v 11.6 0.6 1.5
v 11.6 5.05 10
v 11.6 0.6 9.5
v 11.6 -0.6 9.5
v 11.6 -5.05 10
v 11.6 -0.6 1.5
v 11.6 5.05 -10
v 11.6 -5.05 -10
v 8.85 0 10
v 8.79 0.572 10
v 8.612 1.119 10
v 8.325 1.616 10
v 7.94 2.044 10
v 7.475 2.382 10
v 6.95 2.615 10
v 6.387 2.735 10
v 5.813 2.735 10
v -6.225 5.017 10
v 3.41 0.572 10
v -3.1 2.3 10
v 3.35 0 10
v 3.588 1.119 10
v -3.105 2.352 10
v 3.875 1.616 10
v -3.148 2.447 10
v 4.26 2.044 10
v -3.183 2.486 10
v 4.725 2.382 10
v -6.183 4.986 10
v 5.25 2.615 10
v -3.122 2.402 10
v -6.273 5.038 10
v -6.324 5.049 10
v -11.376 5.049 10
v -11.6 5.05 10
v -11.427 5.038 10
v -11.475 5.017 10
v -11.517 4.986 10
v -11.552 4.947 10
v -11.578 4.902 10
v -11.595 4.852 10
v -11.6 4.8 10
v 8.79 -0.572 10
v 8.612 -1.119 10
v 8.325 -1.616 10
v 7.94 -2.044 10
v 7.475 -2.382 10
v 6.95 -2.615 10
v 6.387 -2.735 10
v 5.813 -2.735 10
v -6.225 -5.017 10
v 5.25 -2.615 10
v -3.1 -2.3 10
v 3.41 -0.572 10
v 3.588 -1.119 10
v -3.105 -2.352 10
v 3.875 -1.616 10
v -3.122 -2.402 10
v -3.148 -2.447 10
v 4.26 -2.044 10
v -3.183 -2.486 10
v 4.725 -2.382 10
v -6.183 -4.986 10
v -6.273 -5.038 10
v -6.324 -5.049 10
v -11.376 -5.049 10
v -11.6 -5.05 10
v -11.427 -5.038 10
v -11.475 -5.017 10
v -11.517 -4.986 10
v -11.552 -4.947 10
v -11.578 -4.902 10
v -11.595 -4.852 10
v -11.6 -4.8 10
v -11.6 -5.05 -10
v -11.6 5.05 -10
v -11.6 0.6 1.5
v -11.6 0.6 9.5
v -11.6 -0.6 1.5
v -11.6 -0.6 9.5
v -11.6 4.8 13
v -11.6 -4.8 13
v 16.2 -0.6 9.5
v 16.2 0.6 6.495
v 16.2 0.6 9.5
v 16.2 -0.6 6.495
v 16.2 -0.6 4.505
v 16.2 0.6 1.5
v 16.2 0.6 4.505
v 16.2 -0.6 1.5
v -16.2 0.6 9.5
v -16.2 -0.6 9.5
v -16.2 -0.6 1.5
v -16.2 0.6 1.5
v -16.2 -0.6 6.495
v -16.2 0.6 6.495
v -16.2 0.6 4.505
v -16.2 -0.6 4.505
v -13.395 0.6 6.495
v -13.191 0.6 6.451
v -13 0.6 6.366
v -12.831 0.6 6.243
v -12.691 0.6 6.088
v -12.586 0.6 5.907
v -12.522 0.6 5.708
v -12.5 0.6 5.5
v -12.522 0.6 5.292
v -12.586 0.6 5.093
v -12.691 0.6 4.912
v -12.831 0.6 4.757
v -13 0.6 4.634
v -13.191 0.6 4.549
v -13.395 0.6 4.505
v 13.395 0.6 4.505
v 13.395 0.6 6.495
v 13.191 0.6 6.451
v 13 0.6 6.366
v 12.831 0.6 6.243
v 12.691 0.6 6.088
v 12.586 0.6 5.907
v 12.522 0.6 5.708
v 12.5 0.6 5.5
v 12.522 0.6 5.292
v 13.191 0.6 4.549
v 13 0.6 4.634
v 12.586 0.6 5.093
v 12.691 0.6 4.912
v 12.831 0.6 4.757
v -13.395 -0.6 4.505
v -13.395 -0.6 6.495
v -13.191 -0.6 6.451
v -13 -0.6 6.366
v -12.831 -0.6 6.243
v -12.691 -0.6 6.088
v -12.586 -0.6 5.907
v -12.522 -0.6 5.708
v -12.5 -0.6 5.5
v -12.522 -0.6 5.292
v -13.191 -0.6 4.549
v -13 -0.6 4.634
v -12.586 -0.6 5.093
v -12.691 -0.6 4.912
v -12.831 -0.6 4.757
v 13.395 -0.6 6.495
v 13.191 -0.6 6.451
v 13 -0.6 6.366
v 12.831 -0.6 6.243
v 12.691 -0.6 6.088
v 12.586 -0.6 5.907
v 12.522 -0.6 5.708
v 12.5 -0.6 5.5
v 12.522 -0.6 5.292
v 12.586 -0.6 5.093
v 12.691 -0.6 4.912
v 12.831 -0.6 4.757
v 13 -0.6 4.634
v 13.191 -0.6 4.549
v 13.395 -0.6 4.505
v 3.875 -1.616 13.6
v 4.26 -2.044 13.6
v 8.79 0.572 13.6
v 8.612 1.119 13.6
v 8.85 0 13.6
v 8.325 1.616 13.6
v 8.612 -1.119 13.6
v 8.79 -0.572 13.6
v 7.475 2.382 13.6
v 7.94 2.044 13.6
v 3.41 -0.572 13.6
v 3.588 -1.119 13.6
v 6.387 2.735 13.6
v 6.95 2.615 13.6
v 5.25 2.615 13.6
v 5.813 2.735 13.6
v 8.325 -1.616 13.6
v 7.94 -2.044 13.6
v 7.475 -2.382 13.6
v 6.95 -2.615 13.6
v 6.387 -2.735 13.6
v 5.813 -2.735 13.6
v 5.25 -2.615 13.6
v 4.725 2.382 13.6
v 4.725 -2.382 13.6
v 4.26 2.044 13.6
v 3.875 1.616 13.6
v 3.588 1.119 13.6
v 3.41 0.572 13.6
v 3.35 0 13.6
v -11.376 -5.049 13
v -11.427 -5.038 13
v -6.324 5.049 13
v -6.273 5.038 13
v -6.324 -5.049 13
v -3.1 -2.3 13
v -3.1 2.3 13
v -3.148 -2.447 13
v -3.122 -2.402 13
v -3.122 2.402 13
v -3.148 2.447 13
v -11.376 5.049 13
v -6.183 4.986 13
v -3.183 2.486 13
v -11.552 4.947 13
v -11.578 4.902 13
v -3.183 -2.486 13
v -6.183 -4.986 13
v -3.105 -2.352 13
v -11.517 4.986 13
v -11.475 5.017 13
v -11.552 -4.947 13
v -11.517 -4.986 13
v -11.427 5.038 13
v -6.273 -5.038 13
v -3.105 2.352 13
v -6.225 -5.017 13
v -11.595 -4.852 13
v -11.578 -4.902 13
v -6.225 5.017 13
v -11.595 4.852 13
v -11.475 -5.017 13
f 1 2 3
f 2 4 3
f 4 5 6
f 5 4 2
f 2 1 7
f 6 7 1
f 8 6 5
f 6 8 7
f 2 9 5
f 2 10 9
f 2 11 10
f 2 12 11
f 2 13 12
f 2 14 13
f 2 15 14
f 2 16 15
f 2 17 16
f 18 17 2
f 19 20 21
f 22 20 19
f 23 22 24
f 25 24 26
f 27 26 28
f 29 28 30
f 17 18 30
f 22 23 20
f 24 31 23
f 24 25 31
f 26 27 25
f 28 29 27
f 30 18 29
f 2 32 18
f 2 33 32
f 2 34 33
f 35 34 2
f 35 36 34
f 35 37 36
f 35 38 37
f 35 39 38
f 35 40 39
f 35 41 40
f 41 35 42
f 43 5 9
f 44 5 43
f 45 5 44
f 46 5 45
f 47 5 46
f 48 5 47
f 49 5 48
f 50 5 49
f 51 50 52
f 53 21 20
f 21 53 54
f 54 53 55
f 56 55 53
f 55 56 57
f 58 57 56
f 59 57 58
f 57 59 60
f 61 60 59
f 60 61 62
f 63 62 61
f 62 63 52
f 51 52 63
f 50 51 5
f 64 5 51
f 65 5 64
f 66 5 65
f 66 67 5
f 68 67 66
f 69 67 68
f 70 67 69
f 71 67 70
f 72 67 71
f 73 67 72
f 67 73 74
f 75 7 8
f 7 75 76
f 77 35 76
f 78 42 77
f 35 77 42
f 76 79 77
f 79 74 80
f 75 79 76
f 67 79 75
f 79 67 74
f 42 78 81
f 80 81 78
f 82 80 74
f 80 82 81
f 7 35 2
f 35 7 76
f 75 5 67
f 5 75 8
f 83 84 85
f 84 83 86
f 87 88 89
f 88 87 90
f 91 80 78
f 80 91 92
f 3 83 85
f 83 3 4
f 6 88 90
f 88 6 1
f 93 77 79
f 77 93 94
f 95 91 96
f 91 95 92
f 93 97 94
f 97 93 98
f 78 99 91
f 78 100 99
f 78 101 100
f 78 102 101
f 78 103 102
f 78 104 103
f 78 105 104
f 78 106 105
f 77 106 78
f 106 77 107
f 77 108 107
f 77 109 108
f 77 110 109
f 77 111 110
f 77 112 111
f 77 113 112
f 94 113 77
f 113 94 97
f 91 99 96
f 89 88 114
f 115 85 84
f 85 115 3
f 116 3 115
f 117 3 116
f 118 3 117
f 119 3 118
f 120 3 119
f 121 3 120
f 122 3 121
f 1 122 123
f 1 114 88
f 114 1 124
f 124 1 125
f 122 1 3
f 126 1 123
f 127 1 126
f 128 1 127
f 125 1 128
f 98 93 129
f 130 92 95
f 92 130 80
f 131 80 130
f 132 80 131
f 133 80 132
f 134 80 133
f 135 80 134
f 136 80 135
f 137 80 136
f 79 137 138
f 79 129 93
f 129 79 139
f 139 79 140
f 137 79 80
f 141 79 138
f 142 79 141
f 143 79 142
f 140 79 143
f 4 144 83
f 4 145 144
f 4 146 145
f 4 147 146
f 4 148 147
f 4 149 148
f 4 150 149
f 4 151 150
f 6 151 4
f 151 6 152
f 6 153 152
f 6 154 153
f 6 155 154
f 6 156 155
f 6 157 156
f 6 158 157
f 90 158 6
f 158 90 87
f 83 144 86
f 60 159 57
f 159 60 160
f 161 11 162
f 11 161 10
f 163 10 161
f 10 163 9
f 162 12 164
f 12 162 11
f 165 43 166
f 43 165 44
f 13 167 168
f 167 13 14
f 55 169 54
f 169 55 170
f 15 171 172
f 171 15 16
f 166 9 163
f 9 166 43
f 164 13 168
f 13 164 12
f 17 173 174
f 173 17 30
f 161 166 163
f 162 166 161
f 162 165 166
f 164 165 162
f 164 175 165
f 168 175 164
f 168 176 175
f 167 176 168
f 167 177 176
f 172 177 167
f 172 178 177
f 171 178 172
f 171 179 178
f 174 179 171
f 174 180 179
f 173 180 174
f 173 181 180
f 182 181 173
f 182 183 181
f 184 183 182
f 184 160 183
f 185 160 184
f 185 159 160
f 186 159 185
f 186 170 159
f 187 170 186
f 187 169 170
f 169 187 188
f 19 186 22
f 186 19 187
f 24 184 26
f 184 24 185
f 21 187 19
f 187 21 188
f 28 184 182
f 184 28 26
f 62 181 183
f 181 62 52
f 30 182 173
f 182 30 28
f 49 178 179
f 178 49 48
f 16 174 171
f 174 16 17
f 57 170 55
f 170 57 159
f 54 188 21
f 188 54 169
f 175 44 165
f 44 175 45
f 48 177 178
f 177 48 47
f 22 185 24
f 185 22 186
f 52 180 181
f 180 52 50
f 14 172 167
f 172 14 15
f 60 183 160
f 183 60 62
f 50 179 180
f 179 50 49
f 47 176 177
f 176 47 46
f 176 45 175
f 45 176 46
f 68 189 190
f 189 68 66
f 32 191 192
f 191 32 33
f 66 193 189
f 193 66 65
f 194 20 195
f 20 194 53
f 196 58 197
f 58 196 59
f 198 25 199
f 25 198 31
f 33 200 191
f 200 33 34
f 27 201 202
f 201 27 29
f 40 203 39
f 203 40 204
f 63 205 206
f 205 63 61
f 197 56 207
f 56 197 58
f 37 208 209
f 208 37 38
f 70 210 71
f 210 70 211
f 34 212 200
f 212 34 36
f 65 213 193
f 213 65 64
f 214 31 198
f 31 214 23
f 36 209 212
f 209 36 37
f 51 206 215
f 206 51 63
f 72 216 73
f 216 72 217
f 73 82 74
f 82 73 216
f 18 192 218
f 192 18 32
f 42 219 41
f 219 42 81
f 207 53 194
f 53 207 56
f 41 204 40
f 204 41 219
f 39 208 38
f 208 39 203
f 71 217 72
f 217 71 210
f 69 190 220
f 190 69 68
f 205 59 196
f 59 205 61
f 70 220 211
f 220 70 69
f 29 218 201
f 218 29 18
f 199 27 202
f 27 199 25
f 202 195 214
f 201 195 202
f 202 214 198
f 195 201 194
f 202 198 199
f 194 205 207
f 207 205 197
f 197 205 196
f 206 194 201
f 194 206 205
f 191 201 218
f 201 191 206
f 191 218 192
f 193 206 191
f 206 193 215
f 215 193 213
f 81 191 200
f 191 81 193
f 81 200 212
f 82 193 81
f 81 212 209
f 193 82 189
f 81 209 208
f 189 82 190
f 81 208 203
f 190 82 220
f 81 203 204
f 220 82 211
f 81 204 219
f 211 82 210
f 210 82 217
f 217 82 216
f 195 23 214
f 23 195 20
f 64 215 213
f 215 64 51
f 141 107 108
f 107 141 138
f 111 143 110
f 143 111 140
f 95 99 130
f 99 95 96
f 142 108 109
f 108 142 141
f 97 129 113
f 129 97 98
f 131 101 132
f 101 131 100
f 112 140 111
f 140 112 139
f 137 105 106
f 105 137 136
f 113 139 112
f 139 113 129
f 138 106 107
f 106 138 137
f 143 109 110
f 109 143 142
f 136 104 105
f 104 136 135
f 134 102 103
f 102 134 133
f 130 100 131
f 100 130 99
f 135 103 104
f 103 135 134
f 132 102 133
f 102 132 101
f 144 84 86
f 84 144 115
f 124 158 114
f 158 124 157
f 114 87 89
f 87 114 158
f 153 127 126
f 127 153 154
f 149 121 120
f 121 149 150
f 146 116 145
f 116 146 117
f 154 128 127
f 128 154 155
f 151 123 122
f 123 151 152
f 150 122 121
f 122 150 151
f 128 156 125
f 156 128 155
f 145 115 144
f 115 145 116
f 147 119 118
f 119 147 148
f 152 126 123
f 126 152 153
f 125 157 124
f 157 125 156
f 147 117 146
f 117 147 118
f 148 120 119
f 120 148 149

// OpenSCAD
// file: ../../parameters.scad
maximum_printable_size = 150;

layer_thickness = 0.3;
global_clearance = 0.5;


//Screw diameter and nut for M10 [mm]
M10_screw_diameter = 10.4;
M10_head_height = 10;
M10_head_diameter = 16+0.5;
M10_nut_height = 10.5;
M10_nut_diameter = 25.5;
M10_nut_pocket = 22.3;

//Screw diameter for M8 [mm]
M8_screw_diameter = 8.6;
M8_head_height = 8;
M8_head_diameter = 13.5;
M8_nut_height = 7.5;
M8_square_nut_thin_height = 4.5;
M8_nut_diameter = 14.4 + 0.5;
M8_nut_pocket = 13 + 0.5;
M8_washer_diameter = 16;
M8_washer_thickness = 1.5;


//Screw diameter and nut for M6 [mm]
M6_screw_diameter=6.5;
M6_head_diameter = 10+0.5;
M6_head_height = 6;
M6_nut_height = 4.9;
M6_nut_diameter = 11.8;
M6_nut_pocket = 10.4;
M6_square_nut_height = 3;
M6_square_nut_diameter = 10;
M6_washer_thickness = 1.6;

//Screw diameter and nut for M5 [mm]
M5_screw_diameter=5.5;
M5_head_height = 5;
M5_head_diameter = 13+0.5;
M5_nut_height = 4.5;
M5_nut_diameter = 9.4;
M5_nut_pocket = 8.4;

//Screw diameter and nut for M4 [mm]
M4_screw_diameter=4.5;
M4_screw_head_height = 4;
M4_nut_height = 3.2;
M4_nut_diameter = 8.4;
M4_nut_pocket = 7.5;

//Screw diameter and nut for M3 [mm]
M3_screw_diameter = 3.2;
M3_nut_height = 2.7;
M3_nut_diameter = 6.6;
M3_nut_pocket = 5.6;
M3_screw_head_height = 3;

//Screw diameter and nut for M2,5 [mm]
M2_5_screw_diameter = 2.7;
M2_5_nut_height = 2.3;
M2_5_nut_diameter = 6;
M2_5_nut_pocket = 5.5;

// kulove lozisko

bearing_efsm_08_h = 33+1;
bearing_efsm_08_m = 22;
bearing_efsm_08_db = 18;
bearing_efsm_08_ag = 10.5;
bearing_efsm_08_n = M4_screw_diameter;
bearing_efsm_08_a1 = 5.5;
bearing_efsm_08_d = 8.25;
bearing_efsm_08_B = 8; // ball height

bearing_efsm_10_h = 38+1;
bearing_efsm_10_m = 26;
bearing_efsm_10_db = 21.9;
bearing_efsm_10_ag = 12+0.2;
bearing_efsm_10_n = M5_screw_diameter;
bearing_efsm_10_a1 = 6.5;
bearing_efsm_10_d = 10.25;


bearing_efsm_12_width = 40+1;
bearing_efsm_12_h = bearing_efsm_12_width;
bearing_efsm_12_boltd = 28/2; // polovina vzdalenosti mezi srouby
bearing_efsm_12_m = bearing_efsm_12_boltd*2;
bearing_efsm_12_db = 25;
bearing_efsm_12_ag = 13;
bearing_efsm_12_a1 = 7;
bearing_efsm_12_n = M5_screw_diameter;
bearing_efsm_12_d = 12.15;
bearing_efsm_12_B = 10; // ball height
bearing_efsm_space = 1;

bearing_efsm_17_width = 54+1;
bearing_efsm_17_h = bearing_efsm_17_width;
bearing_efsm_17_boltd = 38/2; // polovina vzdalenosti mezi srouby
bearing_efsm_17_m = bearing_efsm_17_boltd*2;
bearing_efsm_17_db = 35;
bearing_efsm_17_ag = 18;
bearing_efsm_17_n = M6_screw_diameter;
bearing_efsm_17_a1 = 10;
bearing_efsm_17_B = 17; // ball height

//limcove lozisko
bearing_EFOM_10_L=26; //celkova sirka zakladny
bearing_EFOM_10_d1=10.3;//diametr otvoru real=10 mm
bearing_EFOM_10_dB=22;//diametr vystupku pro ulozeni lozika
bearing_EFOM_10_H=52;//celková delka zakladny
bearing_EFOM_10_J=36;// hole pitch
bearing_EFOM_10_A1=6.5;//vyska pouzdra
bearing_EFOM_10_Ag=12;//celkova vyska
bearing_EFOM_10_N1=5;//sirka otvoru pro sroub
bearing_EFOM_10_N2=8;//delka otvoru pro sroub
bearing_EFOM_10_m=36;//roztec der pro sroub
bearing_EFOM_10_h=9;//vyska lozika


608_bearing_outer_diameter = 22.3;
608_bearing_inner_diameter = 16;
608_bearing_thickness = 7.1;


// 20 KG servo parameters

servo_20kg_axis_offset = 9.375; // jak je osa mimo stredu
servo_20kg_body_x = 42;
servo_20kg_body_y = 21;
servo_20kg_body_z = 40;
servo_20kg_thread_x = 49/2;
servo_20kg_thread_y = 10/2;
servo_20kg_body_below = 10; // jak hluboko je tělo serva pod drzaky na srouby
servo_20kg_below = 25.8; // jak hluboko je páka serva pod drzaky na srouby

servo_20kg_bolt_d = 2.5+0.3;
servo_20kg_nut_d = 5+0.3;


//strain gauge
strain_gauge_width = 12.7;
strain_gauge_length = 75.1;
strain_gauge_screw_distance = 10;

//ALU profile
ALU_profile_width = 30.5;
ALU_profile_holder_wall_thickness = 3;
ALU_profile_groove_width = 8;

//pillow block bearing
//https://www.igus.eu/product/372
//Part no. KSTM-08
KSTM08_screws_distance = 33;         //m
KSTM08_screws_holes_diameter = 4.5;  //d2
KSTM08_flange_thickness = 6;         //h3
KSTM08_case_width = 9;               //C1
KSTM08_case_length = 47;             //a
KSTM08_ball_width = 12;              //B
KSTM08_ball_hole_diameter = 7.85;    //d1


//ložiska pro malý rotor
bearing_outer_diameter = 10.2;    // Rozměr B1 v nákresu s přídavkem na toleranci otvoru
bearing_thickness = 4;        // Rozměr B2 v nákresu
//bearing_shaft_length = 19.5;    // Rozměr B3 v nákresu, Originalni hodnota 19.5
bearing_shaft_length = 20;    // Rozměr B3 v nákresu


//simple platform parameters ////////////////////////////////////////////
front_holder_width = 160;
front_holder_angle = 25;
front_holder_height = 60;
front_holder_offset = 15;
front_holder_height_offset = 75;

// lock moving servo parameters
// static par.
servo_length = 23.2;
servo_width = 10.1;
servo_height = 20;
servo_axle_offset = 12.5;
servo_axle_height = 5;
servo_movement_angle = 70;
servo_movement_angle_offset = -35; // angle offset up
servo_force = 0.43; // [N/m] torque of servo

// dynamic par.
servo_arm_length = servo_width/2+ALU_profile_width/2+ALU_profile_holder_wall_thickness;
servo_travel_y = cos((servo_movement_angle-abs(servo_movement_angle_offset))/2)*servo_arm_length;
servo_arm_hole_length = (servo_arm_length/cos(servo_movement_angle/2))-servo_arm_length+M3_screw_diameter;
servo_joint_offset = sin(servo_movement_angle+servo_movement_angle_offset)*(servo_arm_length+servo_arm_hole_length)+servo_axle_offset;
servo_joint_offset_by_angle = -tan(servo_movement_angle_offset)*servo_arm_length;
servo_max_linear_force = servo_force/(servo_arm_length/1000); // max servo linear force [N]
servo_min_linear_force = cos(servo_movement_angle+abs(servo_movement_angle_offset))*servo_max_linear_force; // min servo linear force [N] in the most extreme position
servo_holding_linear_force = cos(servo_movement_angle+servo_movement_angle_offset)*servo_max_linear_force; // min servo linear force [N] in holding position

// lock static parameters
lock_screws_dia = 3.08;
lock_depth = 20;
lock_axle_diameter = 15;
lock_grab_axle_dia = 13;
lock_arms_joint_offset = 30;
lock_arms_joint_angle = 89;
lock_tooth_width = 2;

// lock dynamic parameters
lock_push_force = (servo_holding_linear_force/cos(lock_arms_joint_angle))/cos(lock_arms_joint_angle); // lock arm pushing force on linear servo joint
lock_push_arm_length = 45;
lock_arm_force_ratio = 1; // lock arm change holding force ratio (0.5 = arm will have half holding force)
lock_hold_arm_length = lock_push_arm_length/lock_arm_force_ratio;
lock_holding_force = lock_push_force*lock_arm_force_ratio;
lock_joint_arm_length = lock_push_arm_length;
// main file
include <../../parameters.scad>

module D485HW_servo(screw_holes=false) {
	difference() {
		union() {
			cube([39.8, 19.8, 38], center=true);

			translate([0, 0, 28-38/2+1.25/2])
			cube([53.5, 19.8, 1.25], center=true);

			translate([53.5/2-16.8, 0, 38/2-1])
			cylinder(d=M5_screw_diameter, h=7.6, $fn=30);
		}

		if(screw_holes==false) {
			translate([-48.5/2, 5, 0])
			cylinder(d=M3_screw_diameter, h=30, $fn=30);

			translate([-48.5/2, -5, 0])
			cylinder(d=M3_screw_diameter, h=30, $fn=30);

			translate([48.5/2, 5, 0])
			cylinder(d=M3_screw_diameter, h=30, $fn=30);

			translate([48.5/2, -5, 0])
			cylinder(d=M3_screw_diameter, h=30, $fn=30);
		}
	}

	if(screw_holes==true) {
		translate([-48.5/2, 5, 0])
		cylinder(d=M3_screw_diameter, h=30, $fn=30);

		translate([-48.5/2, -5, 0])
		cylinder(d=M3_screw_diameter, h=30, $fn=30);

		translate([48.5/2, 5, 0])
		cylinder(d=M3_screw_diameter, h=30, $fn=30);

		translate([48.5/2, -5, 0])
		cylinder(d=M3_screw_diameter, h=30, $fn=30);
	}
}

module D5313_servo(screw_holes=false) {
	difference() {
		union() {
			cube([23.1, 12.1, 26.7], center=true);

			translate([0, 0, 26.7/2-7])
			cube([32, 12.1, 1.25], center=true);

			translate([23.1/2-5.5, 0, 26.7/2-1])
			cylinder(d=M5_screw_diameter, h=4.6, $fn=30);
		}

		if(screw_holes==false) {
			translate([-28/2, 6.5/2, 0])
			cylinder(d=M2_5_screw_diameter, h=30, $fn=30);

			translate([-28/2, -6.5/2, 0])
			cylinder(d=M2_5_screw_diameter, h=30, $fn=30);

			translate([28/2, 6.5/2, 0])
			cylinder(d=M2_5_screw_diameter, h=30, $fn=30);

			translate([28/2, -6.5/2, 0])
			cylinder(d=M2_5_screw_diameter, h=30, $fn=30);
		}
	}

	if(screw_holes==true) {
		translate([-28/2, 6.5/2, 0])
		cylinder(d=M2_5_screw_diameter, h=30, $fn=30);

		translate([-28/2, -6.5/2, 0])
		cylinder(d=M2_5_screw_diameter, h=30, $fn=30);

		translate([28/2, 6.5/2, 0])
		cylinder(d=M2_5_screw_diameter, h=30, $fn=30);

		translate([28/2, -6.5/2, 0])
		cylinder(d=M2_5_screw_diameter, h=30, $fn=30);
	}
}

module BMS_115HV_servo(screw_holes=false) {
	difference() {
		union() {
			cube([23.2, 10.1, 20], center=true);

			translate([0, 0, 20/2-4.5])
			cube([32.4, 1.2, 8], center=true);

			translate([23.2/2-5.5, 0, 20/2-1])
			cylinder(d=M5_screw_diameter, h=4.6, $fn=30);

			translate([-(23.2-0.5)/2, 0, 20/2])
			hull() {
				translate([0, (10.1-0.5)/2, 0])
				cylinder(d=0.5, h=3, $fn=30);

				translate([0, -(10.1-0.5)/2, 0])
				cylinder(d=0.5, h=3, $fn=30);

				translate([5, (10.1-0.5)/2, 0])
				cylinder(d=0.5, h=3, $fn=30);

				translate([5, -(10.1-0.5)/2, 0])
				cylinder(d=0.5, h=3, $fn=30);

				translate([8, (10.1-0.5-5)/2, 0])
				cylinder(d=0.5, h=3, $fn=30);

				translate([8, -(10.1-0.5-5)/2, 0])
				cylinder(d=0.5, h=3, $fn=30);
			}
		}

		rotate([90, 0, 0])
		if(screw_holes==false) {
			hull() {
				translate([-40/2, 20/2-4.5, -15])
				cylinder(d=2, h=30, $fn=30);

				translate([-27/2, 20/2-4.5, -15])
				cylinder(d=2, h=30, $fn=30);
			}

			hull() {
				translate([40/2, 20/2-4.5, -15])
				cylinder(d=2, h=30, $fn=30);

				translate([27/2, 20/2-4.5, -15])
				cylinder(d=2, h=30, $fn=30);
			}
		}
	}

	rotate([90, 0, 0])
	if(screw_holes==true) {
		translate([-27/2, 20/2-4.5, -15])
		cylinder(d=2, h=30, $fn=30);

		translate([27/2, 20/2-4.5, -15])
		cylinder(d=2, h=30, $fn=30);
	}
}

BMS_115HV_servo();
